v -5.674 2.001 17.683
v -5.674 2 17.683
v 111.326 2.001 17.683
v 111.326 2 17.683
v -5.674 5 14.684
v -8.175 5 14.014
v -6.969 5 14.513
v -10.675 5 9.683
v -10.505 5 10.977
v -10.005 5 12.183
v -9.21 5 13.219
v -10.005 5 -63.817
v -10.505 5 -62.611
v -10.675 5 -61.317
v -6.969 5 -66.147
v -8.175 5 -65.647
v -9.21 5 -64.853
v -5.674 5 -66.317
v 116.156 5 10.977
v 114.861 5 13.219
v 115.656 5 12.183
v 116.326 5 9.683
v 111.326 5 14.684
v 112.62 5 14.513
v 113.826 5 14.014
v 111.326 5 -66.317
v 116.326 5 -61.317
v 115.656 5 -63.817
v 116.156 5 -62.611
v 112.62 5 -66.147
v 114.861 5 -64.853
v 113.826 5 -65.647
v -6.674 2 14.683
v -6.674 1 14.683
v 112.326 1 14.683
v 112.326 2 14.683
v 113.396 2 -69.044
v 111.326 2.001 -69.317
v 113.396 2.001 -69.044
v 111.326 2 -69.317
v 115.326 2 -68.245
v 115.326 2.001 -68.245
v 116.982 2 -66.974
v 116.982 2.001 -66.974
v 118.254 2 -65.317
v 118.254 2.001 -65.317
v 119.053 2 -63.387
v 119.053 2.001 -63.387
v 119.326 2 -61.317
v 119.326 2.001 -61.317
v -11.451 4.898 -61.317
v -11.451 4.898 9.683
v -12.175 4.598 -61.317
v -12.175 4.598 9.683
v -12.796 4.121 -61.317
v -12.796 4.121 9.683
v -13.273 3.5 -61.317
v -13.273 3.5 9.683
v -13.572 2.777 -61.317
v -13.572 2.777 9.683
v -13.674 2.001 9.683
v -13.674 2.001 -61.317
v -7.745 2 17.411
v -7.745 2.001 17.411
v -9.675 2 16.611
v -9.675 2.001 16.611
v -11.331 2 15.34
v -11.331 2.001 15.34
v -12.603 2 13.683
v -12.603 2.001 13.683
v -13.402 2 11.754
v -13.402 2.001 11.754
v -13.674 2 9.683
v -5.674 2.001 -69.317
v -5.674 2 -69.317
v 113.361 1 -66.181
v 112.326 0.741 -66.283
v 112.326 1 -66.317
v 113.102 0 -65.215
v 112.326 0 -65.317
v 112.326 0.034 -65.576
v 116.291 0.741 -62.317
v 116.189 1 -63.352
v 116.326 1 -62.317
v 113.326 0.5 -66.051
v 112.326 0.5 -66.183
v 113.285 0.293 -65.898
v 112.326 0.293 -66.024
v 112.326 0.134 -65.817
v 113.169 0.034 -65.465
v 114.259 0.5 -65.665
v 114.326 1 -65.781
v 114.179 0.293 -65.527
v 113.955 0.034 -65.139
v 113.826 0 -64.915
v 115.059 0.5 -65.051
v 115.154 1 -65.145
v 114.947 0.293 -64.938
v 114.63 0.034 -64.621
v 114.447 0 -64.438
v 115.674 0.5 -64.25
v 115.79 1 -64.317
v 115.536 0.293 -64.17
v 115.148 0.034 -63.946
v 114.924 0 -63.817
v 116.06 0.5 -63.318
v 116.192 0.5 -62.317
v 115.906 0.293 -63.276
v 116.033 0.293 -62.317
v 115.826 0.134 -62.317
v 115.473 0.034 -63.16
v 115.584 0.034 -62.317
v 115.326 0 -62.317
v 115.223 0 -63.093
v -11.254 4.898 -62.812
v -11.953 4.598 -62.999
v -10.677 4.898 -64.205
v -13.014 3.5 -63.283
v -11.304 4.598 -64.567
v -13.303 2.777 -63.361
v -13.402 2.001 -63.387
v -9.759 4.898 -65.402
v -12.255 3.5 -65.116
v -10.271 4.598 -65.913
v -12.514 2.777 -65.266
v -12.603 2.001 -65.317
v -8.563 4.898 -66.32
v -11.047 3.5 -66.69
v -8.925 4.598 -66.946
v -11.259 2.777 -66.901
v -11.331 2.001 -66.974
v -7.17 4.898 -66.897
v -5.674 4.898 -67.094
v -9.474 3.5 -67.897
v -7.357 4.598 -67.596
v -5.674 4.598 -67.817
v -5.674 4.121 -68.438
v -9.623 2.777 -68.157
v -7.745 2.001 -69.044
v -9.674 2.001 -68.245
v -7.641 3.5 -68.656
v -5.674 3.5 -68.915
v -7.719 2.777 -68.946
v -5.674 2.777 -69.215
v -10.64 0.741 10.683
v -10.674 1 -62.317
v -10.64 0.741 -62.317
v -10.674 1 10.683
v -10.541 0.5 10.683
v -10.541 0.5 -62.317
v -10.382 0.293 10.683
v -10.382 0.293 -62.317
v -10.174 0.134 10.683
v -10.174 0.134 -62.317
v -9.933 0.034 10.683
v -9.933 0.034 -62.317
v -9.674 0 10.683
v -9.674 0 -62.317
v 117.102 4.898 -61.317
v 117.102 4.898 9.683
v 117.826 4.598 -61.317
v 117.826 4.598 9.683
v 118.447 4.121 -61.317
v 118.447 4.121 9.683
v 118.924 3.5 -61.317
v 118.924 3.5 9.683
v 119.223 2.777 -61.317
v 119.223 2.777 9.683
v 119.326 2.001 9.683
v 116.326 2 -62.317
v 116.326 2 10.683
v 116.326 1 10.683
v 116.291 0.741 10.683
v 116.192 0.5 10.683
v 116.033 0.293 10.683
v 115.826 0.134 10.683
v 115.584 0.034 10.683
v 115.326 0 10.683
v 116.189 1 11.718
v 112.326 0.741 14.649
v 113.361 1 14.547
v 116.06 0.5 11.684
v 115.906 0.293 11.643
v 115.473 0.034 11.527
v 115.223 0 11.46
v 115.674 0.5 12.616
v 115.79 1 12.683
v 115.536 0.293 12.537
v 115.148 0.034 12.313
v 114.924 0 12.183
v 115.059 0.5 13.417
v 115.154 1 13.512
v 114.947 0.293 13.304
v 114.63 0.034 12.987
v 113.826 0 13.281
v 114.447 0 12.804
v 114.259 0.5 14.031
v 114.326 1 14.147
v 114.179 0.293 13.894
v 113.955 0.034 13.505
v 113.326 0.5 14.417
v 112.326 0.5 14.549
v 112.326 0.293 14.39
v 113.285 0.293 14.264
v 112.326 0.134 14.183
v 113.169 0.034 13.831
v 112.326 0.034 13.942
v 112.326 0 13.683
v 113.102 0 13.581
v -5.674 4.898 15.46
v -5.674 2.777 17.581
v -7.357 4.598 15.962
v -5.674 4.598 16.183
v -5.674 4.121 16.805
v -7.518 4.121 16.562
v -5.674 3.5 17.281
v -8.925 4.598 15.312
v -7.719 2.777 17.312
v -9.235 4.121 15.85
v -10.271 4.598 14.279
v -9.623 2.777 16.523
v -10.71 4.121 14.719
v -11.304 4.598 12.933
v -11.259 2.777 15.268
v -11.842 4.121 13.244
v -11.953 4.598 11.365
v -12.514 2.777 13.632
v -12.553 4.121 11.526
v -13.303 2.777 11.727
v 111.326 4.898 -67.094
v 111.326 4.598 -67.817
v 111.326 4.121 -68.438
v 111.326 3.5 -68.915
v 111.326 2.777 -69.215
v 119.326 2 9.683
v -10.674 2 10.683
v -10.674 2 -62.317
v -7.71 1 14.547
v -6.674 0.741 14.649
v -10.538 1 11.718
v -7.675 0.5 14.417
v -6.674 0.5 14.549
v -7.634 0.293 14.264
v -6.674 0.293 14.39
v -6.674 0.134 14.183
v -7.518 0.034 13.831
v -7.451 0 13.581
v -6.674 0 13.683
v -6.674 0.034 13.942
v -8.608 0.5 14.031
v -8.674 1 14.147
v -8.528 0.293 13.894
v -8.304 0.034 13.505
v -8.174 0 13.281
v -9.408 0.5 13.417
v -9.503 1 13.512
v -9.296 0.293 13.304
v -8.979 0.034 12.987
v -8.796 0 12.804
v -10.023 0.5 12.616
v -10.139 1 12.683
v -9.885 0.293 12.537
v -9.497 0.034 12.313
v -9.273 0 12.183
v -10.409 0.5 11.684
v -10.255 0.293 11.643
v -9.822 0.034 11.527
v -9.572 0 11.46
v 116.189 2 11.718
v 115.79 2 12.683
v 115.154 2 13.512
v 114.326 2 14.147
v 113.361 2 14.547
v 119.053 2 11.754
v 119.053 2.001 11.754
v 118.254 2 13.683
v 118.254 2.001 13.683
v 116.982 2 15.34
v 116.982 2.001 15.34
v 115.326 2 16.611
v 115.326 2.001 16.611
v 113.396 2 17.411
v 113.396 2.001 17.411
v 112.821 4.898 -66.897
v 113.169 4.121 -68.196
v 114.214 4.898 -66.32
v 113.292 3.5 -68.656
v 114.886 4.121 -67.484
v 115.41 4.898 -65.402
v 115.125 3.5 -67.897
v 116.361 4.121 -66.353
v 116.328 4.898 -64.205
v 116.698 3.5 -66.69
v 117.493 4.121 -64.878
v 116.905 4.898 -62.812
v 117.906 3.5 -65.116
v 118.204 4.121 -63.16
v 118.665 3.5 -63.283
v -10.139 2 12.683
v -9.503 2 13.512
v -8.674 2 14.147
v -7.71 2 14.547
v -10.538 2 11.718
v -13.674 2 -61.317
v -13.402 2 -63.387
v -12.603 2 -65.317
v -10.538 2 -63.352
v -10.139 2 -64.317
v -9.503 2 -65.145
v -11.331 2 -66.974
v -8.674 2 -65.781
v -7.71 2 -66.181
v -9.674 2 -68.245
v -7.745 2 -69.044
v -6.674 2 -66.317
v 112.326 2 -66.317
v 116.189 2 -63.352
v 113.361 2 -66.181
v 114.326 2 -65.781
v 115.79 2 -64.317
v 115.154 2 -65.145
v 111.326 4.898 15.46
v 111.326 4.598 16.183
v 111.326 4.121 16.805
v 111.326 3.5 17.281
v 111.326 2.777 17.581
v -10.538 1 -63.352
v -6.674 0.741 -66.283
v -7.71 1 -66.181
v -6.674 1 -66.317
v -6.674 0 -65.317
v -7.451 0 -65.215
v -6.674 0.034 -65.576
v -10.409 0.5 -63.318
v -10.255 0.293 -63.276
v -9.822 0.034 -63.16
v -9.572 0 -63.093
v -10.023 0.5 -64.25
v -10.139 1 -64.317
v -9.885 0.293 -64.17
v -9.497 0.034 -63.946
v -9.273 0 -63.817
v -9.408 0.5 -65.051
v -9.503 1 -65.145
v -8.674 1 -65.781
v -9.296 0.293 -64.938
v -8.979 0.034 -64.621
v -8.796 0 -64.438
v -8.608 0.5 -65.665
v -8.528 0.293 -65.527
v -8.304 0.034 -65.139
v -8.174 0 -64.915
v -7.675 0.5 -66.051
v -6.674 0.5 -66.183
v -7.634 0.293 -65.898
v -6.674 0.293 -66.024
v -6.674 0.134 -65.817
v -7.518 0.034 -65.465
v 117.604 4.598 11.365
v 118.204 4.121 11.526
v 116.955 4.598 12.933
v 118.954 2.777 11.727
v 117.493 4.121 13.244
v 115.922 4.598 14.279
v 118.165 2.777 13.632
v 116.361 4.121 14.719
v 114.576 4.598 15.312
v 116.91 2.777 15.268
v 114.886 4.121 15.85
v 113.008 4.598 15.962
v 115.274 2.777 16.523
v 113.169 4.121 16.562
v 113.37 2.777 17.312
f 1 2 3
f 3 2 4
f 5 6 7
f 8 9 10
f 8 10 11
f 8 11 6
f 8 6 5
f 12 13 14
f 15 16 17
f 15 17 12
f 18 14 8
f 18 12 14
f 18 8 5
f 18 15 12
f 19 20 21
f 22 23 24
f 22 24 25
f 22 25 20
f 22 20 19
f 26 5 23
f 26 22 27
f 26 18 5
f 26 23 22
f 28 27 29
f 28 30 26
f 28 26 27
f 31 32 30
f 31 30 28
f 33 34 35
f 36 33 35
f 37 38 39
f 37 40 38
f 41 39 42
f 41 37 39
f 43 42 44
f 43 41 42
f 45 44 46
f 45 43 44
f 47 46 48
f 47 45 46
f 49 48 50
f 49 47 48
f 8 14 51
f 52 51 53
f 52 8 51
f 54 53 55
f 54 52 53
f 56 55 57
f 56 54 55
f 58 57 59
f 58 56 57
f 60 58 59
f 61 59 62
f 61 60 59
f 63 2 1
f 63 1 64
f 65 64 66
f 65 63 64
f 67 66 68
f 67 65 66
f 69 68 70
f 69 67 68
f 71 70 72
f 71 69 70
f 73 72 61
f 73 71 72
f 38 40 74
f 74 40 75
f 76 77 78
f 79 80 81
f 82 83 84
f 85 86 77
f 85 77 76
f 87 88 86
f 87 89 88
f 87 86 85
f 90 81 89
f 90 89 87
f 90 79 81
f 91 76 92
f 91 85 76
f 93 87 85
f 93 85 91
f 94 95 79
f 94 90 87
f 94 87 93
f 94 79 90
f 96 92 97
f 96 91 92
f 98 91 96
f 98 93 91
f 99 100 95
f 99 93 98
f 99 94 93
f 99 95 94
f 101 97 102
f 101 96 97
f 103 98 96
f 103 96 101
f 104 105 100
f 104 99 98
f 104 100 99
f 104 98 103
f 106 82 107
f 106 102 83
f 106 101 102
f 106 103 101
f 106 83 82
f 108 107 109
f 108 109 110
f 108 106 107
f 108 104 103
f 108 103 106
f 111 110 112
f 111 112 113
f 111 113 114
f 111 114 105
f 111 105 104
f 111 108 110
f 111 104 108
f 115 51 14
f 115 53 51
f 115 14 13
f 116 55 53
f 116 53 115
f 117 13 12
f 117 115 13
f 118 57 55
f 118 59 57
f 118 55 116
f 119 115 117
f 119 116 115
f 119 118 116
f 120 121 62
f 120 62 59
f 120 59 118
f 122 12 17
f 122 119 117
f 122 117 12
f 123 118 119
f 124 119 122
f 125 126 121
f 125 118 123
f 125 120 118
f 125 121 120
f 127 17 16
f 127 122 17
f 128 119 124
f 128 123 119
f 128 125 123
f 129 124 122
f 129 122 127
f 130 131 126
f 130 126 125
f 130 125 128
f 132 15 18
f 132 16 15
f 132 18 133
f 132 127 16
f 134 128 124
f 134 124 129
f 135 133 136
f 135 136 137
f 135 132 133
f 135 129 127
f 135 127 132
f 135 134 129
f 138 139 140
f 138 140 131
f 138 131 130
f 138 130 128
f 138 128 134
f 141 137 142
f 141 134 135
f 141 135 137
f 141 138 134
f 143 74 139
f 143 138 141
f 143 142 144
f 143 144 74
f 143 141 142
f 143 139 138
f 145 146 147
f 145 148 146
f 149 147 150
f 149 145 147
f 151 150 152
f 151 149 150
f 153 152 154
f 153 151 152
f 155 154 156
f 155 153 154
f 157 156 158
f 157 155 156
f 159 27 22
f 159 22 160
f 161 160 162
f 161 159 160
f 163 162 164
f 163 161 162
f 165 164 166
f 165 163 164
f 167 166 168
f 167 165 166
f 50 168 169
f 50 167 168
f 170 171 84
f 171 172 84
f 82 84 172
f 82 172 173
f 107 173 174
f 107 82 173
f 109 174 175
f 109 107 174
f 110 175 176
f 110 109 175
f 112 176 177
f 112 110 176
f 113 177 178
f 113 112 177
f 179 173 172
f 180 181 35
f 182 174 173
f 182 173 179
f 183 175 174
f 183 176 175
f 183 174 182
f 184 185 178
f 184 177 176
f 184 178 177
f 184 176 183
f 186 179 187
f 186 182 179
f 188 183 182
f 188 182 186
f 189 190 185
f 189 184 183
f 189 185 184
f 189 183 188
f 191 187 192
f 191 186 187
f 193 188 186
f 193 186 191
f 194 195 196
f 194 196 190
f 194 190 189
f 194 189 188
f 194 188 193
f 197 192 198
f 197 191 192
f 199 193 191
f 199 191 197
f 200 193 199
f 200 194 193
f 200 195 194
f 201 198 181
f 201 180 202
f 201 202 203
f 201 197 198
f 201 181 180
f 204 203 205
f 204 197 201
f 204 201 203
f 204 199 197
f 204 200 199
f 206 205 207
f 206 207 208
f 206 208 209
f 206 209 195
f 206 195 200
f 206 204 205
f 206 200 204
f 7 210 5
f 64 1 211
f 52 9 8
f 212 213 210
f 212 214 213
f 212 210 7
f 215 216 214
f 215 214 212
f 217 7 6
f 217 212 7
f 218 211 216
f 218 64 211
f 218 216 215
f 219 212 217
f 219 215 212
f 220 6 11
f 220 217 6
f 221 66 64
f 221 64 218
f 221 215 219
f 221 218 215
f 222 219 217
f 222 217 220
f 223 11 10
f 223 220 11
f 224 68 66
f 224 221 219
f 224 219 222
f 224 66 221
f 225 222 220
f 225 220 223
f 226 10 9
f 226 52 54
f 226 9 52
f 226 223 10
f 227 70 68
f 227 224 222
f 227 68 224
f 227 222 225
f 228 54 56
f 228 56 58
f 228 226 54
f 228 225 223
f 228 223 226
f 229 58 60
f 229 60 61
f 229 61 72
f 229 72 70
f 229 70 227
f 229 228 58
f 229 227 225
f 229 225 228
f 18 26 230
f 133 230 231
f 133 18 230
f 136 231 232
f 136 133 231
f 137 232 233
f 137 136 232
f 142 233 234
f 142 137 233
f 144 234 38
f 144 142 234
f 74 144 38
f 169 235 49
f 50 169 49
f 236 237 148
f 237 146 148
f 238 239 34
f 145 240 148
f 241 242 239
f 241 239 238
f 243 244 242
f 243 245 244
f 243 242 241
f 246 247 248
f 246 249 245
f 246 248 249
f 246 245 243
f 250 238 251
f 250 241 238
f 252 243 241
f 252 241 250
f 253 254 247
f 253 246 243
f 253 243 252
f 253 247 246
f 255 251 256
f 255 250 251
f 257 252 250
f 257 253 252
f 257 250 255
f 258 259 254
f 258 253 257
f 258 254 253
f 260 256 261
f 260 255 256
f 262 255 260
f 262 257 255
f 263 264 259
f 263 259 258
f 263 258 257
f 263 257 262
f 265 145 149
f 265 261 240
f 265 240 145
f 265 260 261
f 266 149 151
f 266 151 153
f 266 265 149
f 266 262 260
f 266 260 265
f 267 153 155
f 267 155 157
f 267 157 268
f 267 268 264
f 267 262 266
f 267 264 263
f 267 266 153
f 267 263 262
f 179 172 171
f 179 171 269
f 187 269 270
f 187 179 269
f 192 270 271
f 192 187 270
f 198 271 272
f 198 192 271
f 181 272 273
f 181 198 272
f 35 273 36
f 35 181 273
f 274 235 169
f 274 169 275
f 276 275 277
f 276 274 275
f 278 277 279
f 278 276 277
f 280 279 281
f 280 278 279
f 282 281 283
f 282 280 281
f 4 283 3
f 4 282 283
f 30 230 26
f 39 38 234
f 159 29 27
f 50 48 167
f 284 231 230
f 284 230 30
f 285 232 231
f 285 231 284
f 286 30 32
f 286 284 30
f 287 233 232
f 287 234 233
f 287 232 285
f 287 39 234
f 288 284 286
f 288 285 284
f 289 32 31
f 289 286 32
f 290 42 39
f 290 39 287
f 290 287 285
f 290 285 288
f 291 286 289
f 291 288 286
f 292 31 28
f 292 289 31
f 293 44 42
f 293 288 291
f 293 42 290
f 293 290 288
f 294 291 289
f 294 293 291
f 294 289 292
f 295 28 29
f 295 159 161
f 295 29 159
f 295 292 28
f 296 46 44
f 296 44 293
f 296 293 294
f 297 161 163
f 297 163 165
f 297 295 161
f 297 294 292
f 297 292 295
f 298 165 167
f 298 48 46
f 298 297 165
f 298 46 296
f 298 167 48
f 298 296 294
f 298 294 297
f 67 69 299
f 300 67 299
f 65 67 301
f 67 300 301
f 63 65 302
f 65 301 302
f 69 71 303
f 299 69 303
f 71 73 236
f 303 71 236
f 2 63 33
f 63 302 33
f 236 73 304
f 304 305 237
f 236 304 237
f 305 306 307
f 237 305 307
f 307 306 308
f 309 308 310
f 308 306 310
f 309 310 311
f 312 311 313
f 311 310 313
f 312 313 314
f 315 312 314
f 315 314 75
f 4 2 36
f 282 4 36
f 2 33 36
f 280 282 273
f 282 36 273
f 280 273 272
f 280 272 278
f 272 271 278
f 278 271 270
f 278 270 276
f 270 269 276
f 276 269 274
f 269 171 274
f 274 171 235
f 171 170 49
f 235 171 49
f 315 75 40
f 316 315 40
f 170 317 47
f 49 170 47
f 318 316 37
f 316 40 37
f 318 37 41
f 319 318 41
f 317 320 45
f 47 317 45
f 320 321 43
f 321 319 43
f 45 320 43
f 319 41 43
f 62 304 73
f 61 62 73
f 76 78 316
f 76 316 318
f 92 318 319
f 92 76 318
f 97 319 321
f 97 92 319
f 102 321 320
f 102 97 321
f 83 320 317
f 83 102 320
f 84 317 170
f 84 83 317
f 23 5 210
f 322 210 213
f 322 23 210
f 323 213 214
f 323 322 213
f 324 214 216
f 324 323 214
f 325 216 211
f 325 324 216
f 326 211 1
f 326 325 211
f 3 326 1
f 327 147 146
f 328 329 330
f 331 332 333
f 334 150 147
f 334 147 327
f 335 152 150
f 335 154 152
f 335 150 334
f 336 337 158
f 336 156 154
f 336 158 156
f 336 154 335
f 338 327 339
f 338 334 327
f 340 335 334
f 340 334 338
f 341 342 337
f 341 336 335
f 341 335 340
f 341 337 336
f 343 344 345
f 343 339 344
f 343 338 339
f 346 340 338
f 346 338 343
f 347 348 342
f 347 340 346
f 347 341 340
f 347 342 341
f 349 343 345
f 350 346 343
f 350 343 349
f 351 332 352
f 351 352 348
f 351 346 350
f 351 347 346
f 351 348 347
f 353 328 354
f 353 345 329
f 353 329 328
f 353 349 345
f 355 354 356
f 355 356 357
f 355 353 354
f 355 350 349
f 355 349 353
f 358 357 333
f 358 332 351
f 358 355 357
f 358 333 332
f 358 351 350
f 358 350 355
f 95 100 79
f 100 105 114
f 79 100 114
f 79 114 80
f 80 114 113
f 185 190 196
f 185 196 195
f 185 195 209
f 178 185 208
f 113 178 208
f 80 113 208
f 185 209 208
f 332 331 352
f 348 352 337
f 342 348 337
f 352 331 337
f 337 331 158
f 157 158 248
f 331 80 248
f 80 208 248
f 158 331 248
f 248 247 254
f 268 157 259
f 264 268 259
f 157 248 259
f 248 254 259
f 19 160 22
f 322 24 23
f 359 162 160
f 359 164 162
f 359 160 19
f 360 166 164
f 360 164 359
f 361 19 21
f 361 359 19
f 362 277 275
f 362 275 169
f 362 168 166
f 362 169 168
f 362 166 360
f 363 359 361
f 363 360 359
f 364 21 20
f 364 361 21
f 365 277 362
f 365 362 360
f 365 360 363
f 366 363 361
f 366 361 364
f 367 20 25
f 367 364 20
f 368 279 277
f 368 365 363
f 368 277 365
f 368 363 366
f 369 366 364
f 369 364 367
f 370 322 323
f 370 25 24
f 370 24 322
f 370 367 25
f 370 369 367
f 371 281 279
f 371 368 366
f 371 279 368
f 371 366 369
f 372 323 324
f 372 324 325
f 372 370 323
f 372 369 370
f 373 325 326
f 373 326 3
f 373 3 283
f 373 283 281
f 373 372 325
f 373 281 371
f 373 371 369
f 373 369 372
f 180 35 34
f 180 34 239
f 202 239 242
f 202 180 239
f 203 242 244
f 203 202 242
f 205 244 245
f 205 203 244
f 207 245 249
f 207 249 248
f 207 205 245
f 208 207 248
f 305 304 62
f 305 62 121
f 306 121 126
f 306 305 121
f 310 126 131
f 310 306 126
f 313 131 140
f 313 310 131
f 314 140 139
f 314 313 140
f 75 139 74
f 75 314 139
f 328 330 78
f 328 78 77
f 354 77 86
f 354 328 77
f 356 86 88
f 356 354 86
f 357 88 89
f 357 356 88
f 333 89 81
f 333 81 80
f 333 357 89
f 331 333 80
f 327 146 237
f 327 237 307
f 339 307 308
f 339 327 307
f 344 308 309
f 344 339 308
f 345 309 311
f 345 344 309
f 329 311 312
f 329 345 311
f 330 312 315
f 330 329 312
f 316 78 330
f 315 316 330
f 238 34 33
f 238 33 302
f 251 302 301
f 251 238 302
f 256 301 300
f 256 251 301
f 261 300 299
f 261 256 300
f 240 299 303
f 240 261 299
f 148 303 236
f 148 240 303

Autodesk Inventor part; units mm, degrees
ref_plane "YZ Plane" through (0, 0, 0) normal (1, 0, 0) x (0, 1, 0)
ref_plane "XZ Plane" through (0, 0, 0) normal (0, 1, 0) x (-1, 0, 0)
ref_plane "XY Plane" through (0, 0, 0) normal (0, 0, 1) x (1, 0, 0)
sketch "Sketch1" plane through (0, 0, 0) normal (0, 1, 0) x (-1, 0, 0)
  point P0 (0, 0)
sketch "Sketch2" plane through (0, 0, 0) normal (0, 1, 0) x (-1, 0, 0)
  line L0 (6.6745, 14.6831) -> (-112.3255, 14.6831)
  line L1 (-116.3255, 10.6831) -> (-116.3255, -62.3169)
  line L2 (-112.3255, -66.3169) -> (6.6745, -66.3169)
  line L3 (10.6745, -62.3169) -> (10.6745, 10.6831)
  arc A0 (10.6745, 10.6831) -> (6.6745, 14.6831) centre (6.6745, 10.6831) ccw
  arc A1 (6.6745, -66.3169) -> (10.6745, -62.3169) centre (6.6745, -62.3169) ccw
  arc A2 (-116.3255, -62.3169) -> (-112.3255, -66.3169) centre (-112.3255, -62.3169) ccw
  arc A3 (-112.3255, 14.6831) -> (-116.3255, 10.6831) centre (-112.3255, 10.6831) ccw
  point P0 (0, 0)
  point P1 (-116.3255, -66.3169)
  point P2 (-116.3255, 14.6831)
  point P3 (10.6745, -66.3169)
  dimension "d0" = 127
  dimension "d1" = 81
  dimension "d2" = 4
extrude "Extrusion1" add sketch "Sketch2" along normal blind 2
sketch "Sketch3" plane through (0, 2, 0) normal (0, 1, 0) x (1, 0, 0)
  line L0 (-10.6745, 62.3169) -> (-10.6745, -10.6831) projected
  line L1 (-10.6745, -10.6831) -> (-10.6745, -17.6831)
  line L2 (-10.6745, -17.6831) -> (-13.6745, -17.6831)
  line L3 (-5.6745, -17.6831) -> (111.3255, -17.6831)
  line L4 (119.3255, -9.6831) -> (119.3255, 61.3169)
  line L5 (111.3255, 69.3169) -> (-5.6745, 69.3169)
  line L6 (-13.6745, 61.3169) -> (-13.6745, -9.6831)
  arc A0 (-13.6745, -9.6831) -> (-5.6745, -17.6831) centre (-5.6745, -9.6831) ccw
  arc A1 (111.3255, -17.6831) -> (119.3255, -9.6831) centre (111.3255, -9.6831) ccw
  arc A2 (-5.6745, 69.3169) -> (-13.6745, 61.3169) centre (-5.6745, 61.3169) ccw
  arc A3 (119.3255, 61.3169) -> (111.3255, 69.3169) centre (111.3255, 61.3169) ccw
  point P0 (0, 0)
  point P1 (119.3255, 69.3169)
  point P2 (119.3255, -17.6831)
  point P3 (-13.6745, 69.3169)
  dimension "d5" = 7
  dimension "d6" = 3
  dimension "d7" = 133
  dimension "d8" = 87
  dimension "d9" = 8
  dimension "d10" = 8
extrude "Extrusion2" add sketch "Sketch3" along normal blind 3
fillet "Fillet1" radius 3 8 edges at (116.9823, 5, -66.9738) (52.8255, 5, -69.3169) (-11.3314, 5, -66.9738) (-13.6745, 5, -25.8169) (-11.3314, 5, 15.3399) (52.8255, 5, 17.6831) (116.9823, 5, 15.3399) (119.3255, 5, -25.8169)
fillet "Fillet2" radius 1 8 edges at (-9.503, 0, 13.5115) (-10.6745, 0, -25.8169) (-9.503, 0, -65.1453) (52.8255, 0, -66.3169) (115.1539, 0, -65.1453) (116.3255, 0, -25.8169) (115.1539, 0, 13.5115) (52.8255, 0, 14.6831)
properties part number "lid-v2"
